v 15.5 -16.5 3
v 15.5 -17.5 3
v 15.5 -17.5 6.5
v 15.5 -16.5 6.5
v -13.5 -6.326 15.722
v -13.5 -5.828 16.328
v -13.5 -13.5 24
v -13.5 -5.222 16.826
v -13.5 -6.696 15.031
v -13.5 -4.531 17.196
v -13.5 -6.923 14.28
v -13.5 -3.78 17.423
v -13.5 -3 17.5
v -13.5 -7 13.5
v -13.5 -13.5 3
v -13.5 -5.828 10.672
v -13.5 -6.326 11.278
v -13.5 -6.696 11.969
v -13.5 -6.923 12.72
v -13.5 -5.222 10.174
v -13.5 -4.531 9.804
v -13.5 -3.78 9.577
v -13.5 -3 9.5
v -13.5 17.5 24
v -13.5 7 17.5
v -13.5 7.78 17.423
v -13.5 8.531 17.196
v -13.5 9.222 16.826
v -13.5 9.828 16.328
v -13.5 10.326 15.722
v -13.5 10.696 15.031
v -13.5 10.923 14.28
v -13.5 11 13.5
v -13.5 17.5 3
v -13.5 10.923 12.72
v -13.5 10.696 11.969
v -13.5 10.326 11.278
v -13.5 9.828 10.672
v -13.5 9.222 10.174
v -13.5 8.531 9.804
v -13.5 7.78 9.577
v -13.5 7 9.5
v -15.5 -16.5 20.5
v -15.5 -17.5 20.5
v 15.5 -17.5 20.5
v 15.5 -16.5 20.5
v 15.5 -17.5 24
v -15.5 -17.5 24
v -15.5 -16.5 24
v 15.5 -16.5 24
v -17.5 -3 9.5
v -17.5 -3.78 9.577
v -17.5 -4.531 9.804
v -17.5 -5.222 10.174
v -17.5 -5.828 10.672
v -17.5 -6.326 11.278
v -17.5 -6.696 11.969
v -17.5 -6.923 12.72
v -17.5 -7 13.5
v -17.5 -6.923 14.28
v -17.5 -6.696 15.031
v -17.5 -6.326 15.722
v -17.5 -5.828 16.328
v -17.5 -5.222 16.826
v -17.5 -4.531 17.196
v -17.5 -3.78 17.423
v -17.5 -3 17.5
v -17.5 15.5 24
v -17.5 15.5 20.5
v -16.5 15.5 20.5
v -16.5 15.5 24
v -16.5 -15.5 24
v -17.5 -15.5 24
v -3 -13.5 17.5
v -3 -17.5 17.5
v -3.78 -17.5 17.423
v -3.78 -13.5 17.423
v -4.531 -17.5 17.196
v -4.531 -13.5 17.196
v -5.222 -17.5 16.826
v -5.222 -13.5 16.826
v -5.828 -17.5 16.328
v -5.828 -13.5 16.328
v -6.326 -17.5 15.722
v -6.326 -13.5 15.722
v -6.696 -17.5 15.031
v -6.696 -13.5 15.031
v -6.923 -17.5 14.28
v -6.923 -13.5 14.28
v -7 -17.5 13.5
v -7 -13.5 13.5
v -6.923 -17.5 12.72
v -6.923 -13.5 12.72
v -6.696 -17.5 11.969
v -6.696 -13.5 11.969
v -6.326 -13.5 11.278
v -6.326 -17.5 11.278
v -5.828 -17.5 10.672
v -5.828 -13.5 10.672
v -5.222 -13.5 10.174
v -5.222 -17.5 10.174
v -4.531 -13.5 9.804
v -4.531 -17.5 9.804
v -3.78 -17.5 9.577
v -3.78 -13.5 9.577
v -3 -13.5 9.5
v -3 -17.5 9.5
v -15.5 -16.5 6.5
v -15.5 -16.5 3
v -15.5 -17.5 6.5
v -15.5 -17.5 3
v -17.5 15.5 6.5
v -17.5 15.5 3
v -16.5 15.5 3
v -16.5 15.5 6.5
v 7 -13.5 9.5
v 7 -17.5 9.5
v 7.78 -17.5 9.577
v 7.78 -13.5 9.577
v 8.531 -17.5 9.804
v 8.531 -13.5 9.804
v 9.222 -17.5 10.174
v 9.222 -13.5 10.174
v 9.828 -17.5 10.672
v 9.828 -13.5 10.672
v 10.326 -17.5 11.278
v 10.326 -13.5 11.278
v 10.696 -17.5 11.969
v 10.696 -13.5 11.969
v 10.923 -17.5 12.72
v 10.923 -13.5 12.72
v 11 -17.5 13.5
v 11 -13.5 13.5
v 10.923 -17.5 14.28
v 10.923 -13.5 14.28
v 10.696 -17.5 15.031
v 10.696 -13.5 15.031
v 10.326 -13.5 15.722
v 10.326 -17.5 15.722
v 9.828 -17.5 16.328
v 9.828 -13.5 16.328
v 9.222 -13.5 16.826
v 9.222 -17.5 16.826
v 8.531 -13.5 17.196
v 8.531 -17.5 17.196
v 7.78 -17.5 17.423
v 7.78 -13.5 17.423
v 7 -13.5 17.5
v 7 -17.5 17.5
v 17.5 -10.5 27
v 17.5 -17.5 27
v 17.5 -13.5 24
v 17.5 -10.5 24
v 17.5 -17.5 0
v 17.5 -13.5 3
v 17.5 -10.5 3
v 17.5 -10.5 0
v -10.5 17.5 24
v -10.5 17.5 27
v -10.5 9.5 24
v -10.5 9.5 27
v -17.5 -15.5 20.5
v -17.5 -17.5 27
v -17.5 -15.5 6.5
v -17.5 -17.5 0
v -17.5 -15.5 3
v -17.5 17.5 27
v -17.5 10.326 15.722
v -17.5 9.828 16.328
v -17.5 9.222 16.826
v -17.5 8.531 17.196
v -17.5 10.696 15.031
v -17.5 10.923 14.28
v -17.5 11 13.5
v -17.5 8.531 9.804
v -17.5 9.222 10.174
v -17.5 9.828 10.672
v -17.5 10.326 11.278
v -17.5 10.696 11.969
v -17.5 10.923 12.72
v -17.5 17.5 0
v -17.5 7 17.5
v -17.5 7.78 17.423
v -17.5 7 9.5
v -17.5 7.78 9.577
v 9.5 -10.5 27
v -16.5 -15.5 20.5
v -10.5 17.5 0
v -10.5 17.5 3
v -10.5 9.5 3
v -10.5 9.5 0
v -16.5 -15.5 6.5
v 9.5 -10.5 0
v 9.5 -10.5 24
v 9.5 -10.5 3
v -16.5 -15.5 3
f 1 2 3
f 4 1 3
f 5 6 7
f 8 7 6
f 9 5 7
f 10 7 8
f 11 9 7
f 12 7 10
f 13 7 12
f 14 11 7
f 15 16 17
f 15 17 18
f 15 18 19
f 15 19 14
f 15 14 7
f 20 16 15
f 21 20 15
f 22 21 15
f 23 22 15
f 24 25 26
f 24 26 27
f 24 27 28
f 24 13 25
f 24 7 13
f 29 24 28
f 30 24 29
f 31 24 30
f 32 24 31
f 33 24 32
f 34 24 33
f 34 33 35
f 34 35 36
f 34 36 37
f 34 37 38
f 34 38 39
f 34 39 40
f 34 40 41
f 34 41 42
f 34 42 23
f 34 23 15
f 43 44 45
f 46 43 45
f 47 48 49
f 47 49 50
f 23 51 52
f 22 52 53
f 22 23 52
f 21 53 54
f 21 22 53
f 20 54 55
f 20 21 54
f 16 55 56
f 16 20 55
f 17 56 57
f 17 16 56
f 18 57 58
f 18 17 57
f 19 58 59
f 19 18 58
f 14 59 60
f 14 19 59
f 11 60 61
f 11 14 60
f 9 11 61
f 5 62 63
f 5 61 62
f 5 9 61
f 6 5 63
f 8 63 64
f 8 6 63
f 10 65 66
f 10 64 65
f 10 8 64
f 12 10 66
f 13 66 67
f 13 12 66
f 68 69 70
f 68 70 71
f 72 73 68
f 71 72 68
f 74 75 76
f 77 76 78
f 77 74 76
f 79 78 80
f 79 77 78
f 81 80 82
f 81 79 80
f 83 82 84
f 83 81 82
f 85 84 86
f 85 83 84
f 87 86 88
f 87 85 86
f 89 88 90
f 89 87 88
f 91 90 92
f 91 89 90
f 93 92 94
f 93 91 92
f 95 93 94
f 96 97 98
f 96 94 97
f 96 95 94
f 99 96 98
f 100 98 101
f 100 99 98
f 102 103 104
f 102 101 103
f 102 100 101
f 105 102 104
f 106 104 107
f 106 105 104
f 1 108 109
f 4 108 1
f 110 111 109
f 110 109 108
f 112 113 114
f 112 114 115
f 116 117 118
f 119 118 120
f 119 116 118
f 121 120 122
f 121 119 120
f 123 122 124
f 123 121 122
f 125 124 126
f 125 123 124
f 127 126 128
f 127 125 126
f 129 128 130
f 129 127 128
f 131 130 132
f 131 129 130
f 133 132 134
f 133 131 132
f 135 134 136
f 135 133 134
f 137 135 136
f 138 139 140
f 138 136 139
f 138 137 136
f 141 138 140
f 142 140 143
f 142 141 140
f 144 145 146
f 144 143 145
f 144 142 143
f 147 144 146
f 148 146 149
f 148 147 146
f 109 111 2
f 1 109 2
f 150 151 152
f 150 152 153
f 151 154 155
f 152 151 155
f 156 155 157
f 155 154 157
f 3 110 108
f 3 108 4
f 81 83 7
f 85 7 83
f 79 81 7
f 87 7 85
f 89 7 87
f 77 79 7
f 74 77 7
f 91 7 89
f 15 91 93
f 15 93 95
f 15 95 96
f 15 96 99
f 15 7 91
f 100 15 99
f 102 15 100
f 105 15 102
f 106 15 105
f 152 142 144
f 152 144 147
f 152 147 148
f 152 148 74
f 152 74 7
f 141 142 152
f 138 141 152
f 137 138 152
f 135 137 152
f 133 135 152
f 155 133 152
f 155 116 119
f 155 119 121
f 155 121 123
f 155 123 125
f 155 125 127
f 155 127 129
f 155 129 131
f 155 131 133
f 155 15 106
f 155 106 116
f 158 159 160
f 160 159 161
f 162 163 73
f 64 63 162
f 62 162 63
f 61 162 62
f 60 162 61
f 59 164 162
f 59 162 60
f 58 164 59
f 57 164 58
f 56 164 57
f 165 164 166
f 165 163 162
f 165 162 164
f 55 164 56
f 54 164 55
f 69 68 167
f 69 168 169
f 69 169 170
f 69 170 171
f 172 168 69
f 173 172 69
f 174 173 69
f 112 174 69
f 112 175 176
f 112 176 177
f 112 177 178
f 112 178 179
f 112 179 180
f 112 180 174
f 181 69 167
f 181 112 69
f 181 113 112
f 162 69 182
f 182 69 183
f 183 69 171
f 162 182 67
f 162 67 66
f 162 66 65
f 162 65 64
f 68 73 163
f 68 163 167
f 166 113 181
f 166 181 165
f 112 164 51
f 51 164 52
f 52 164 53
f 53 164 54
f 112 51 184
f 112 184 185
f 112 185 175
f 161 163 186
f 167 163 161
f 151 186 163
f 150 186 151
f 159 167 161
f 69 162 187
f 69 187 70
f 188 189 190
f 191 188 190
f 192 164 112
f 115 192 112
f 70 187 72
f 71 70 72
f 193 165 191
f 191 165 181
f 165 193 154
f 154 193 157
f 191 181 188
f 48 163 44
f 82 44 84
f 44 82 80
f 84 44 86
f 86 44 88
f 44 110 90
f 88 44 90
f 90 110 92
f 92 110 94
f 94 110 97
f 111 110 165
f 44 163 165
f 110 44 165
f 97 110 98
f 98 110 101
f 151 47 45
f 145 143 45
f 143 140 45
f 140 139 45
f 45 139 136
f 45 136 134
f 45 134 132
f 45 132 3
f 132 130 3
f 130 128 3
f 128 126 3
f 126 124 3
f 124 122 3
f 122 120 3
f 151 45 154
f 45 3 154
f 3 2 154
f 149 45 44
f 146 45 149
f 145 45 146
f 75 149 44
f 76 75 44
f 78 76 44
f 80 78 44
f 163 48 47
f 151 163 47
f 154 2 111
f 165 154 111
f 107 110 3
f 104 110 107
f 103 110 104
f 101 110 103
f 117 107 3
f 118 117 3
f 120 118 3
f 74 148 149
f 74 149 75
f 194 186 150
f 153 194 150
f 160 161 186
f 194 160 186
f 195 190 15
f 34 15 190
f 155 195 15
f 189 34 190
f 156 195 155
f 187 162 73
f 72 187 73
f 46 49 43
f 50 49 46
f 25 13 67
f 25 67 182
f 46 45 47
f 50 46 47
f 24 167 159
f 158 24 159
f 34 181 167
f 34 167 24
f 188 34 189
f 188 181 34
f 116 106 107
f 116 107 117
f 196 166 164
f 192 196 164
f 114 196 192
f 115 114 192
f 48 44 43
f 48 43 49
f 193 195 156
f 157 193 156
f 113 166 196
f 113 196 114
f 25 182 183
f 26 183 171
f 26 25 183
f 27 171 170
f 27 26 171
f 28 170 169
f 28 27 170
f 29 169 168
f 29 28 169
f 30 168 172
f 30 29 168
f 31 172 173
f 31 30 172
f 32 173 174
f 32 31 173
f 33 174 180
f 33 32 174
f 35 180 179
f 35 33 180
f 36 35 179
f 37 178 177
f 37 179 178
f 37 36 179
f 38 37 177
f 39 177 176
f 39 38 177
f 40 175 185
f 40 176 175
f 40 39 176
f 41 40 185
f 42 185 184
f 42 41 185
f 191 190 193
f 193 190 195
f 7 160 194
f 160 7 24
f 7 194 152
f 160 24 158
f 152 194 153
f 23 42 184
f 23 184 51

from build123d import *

# Parameters (mm, degrees)
SKETCH1_W           = 35
SKETCH1_H           = 35
BOSS_EXTRUDE1_DEPTH = 27
SKETCH2_W           = 31
SKETCH2_H           = 21
CUT_EXTRUDE1_DEPTH  = 31
CUT_EXTRUDE2_DEPTH  = 37.626493144
CUT_EXTRUDE3_DEPTH  = 45.679413604
CUT_EXTRUDE4_DEPTH  = 45.679413604
SKETCH7_W           = 31
SKETCH7_H           = 3.5
CUT_EXTRUDE5_DEPTH  = 1
SKETCH8_W           = 31
SKETCH8_H           = 3.5
CUT_EXTRUDE6_DEPTH  = 1
SKETCH9_W           = 3.5
SKETCH9_H           = 31
CUT_EXTRUDE13_DEPTH = 1
SKETCH10_W          = 3.5
SKETCH10_H          = 31
CUT_EXTRUDE14_DEPTH = 1


with BuildPart() as part:
    # Sketch1 → Boss-Extrude1 (new body)
    with BuildSketch(Plane.XY):
        Rectangle(SKETCH1_W, SKETCH1_H)
    extrude(amount=BOSS_EXTRUDE1_DEPTH)

    # Sketch2 → Cut-Extrude1 (cut)
    with BuildSketch(Plane(origin=(0, 17.5, 0), x_dir=(1, 0, 0), z_dir=(0, 1, 0))):
        with Locations((2, -13.5)):
            Rectangle(SKETCH2_W, SKETCH2_H)
    extrude(amount=-CUT_EXTRUDE1_DEPTH, mode=Mode.SUBTRACT)

    # Sketch3 → Cut-Extrude2 (cut, through all)
    with BuildSketch(Plane.XY.offset(27)):
        Polygon((17.5, 17.5), (-10.5, 17.5), (-10.5, 9.5), (9.5, -10.5), (17.5, -10.5), align=None)
    extrude(amount=-CUT_EXTRUDE2_DEPTH, mode=Mode.SUBTRACT)

    # Sketch4 → Cut-Extrude3 (cut, through all)
    with BuildSketch(Plane(origin=(-13.5, 0, 0), x_dir=(0, 0, -1), z_dir=(1, 0, 0))):
        with BuildLine():
            Line((-9.5, 7), (-9.5, -3))
            ThreePointArc((-9.5, -3), (-13.5, -7), (-17.5, -3))
            Line((-17.5, -3), (-17.5, 7))
            ThreePointArc((-17.5, 7), (-13.5, 11), (-9.5, 7))
        make_face()
    extrude(amount=-CUT_EXTRUDE3_DEPTH, mode=Mode.SUBTRACT)

    # Sketch5 → Cut-Extrude4 (cut, through all)
    with BuildSketch(Plane(origin=(0, -13.5, 0), x_dir=(1, 0, 0), z_dir=(0, 1, 0))):
        with BuildLine():
            Line((-3, -9.5), (7, -9.5))
            ThreePointArc((7, -9.5), (11, -13.5), (7, -17.5))
            Line((7, -17.5), (-3, -17.5))
            ThreePointArc((-3, -17.5), (-7, -13.5), (-3, -9.5))
        make_face()
    extrude(amount=-CUT_EXTRUDE4_DEPTH, mode=Mode.SUBTRACT)

    # Sketch7 → Cut-Extrude5 (cut)
    with BuildSketch(Plane.XZ.offset(17.5)):
        with Locations((0, 22.25)):
            Rectangle(SKETCH7_W, SKETCH7_H)
    extrude(amount=-CUT_EXTRUDE5_DEPTH, mode=Mode.SUBTRACT)

    # Sketch8 → Cut-Extrude6 (cut)
    with BuildSketch(Plane.XZ.offset(17.5)):
        with Locations((0, 4.75)):
            Rectangle(SKETCH8_W, SKETCH8_H)
    extrude(amount=-CUT_EXTRUDE6_DEPTH, mode=Mode.SUBTRACT)

    # Sketch9 → Cut-Extrude13 (cut)
    with BuildSketch(Plane.ZY.offset(17.5)):
        with Locations((22.25, 0)):
            Rectangle(SKETCH9_W, SKETCH9_H)
    extrude(amount=-CUT_EXTRUDE13_DEPTH, mode=Mode.SUBTRACT)

    # Sketch10 → Cut-Extrude14 (cut)
    with BuildSketch(Plane.ZY.offset(17.5)):
        with Locations((4.75, 0)):
            Rectangle(SKETCH10_W, SKETCH10_H)
    extrude(amount=-CUT_EXTRUDE14_DEPTH, mode=Mode.SUBTRACT)


solid = part.part
